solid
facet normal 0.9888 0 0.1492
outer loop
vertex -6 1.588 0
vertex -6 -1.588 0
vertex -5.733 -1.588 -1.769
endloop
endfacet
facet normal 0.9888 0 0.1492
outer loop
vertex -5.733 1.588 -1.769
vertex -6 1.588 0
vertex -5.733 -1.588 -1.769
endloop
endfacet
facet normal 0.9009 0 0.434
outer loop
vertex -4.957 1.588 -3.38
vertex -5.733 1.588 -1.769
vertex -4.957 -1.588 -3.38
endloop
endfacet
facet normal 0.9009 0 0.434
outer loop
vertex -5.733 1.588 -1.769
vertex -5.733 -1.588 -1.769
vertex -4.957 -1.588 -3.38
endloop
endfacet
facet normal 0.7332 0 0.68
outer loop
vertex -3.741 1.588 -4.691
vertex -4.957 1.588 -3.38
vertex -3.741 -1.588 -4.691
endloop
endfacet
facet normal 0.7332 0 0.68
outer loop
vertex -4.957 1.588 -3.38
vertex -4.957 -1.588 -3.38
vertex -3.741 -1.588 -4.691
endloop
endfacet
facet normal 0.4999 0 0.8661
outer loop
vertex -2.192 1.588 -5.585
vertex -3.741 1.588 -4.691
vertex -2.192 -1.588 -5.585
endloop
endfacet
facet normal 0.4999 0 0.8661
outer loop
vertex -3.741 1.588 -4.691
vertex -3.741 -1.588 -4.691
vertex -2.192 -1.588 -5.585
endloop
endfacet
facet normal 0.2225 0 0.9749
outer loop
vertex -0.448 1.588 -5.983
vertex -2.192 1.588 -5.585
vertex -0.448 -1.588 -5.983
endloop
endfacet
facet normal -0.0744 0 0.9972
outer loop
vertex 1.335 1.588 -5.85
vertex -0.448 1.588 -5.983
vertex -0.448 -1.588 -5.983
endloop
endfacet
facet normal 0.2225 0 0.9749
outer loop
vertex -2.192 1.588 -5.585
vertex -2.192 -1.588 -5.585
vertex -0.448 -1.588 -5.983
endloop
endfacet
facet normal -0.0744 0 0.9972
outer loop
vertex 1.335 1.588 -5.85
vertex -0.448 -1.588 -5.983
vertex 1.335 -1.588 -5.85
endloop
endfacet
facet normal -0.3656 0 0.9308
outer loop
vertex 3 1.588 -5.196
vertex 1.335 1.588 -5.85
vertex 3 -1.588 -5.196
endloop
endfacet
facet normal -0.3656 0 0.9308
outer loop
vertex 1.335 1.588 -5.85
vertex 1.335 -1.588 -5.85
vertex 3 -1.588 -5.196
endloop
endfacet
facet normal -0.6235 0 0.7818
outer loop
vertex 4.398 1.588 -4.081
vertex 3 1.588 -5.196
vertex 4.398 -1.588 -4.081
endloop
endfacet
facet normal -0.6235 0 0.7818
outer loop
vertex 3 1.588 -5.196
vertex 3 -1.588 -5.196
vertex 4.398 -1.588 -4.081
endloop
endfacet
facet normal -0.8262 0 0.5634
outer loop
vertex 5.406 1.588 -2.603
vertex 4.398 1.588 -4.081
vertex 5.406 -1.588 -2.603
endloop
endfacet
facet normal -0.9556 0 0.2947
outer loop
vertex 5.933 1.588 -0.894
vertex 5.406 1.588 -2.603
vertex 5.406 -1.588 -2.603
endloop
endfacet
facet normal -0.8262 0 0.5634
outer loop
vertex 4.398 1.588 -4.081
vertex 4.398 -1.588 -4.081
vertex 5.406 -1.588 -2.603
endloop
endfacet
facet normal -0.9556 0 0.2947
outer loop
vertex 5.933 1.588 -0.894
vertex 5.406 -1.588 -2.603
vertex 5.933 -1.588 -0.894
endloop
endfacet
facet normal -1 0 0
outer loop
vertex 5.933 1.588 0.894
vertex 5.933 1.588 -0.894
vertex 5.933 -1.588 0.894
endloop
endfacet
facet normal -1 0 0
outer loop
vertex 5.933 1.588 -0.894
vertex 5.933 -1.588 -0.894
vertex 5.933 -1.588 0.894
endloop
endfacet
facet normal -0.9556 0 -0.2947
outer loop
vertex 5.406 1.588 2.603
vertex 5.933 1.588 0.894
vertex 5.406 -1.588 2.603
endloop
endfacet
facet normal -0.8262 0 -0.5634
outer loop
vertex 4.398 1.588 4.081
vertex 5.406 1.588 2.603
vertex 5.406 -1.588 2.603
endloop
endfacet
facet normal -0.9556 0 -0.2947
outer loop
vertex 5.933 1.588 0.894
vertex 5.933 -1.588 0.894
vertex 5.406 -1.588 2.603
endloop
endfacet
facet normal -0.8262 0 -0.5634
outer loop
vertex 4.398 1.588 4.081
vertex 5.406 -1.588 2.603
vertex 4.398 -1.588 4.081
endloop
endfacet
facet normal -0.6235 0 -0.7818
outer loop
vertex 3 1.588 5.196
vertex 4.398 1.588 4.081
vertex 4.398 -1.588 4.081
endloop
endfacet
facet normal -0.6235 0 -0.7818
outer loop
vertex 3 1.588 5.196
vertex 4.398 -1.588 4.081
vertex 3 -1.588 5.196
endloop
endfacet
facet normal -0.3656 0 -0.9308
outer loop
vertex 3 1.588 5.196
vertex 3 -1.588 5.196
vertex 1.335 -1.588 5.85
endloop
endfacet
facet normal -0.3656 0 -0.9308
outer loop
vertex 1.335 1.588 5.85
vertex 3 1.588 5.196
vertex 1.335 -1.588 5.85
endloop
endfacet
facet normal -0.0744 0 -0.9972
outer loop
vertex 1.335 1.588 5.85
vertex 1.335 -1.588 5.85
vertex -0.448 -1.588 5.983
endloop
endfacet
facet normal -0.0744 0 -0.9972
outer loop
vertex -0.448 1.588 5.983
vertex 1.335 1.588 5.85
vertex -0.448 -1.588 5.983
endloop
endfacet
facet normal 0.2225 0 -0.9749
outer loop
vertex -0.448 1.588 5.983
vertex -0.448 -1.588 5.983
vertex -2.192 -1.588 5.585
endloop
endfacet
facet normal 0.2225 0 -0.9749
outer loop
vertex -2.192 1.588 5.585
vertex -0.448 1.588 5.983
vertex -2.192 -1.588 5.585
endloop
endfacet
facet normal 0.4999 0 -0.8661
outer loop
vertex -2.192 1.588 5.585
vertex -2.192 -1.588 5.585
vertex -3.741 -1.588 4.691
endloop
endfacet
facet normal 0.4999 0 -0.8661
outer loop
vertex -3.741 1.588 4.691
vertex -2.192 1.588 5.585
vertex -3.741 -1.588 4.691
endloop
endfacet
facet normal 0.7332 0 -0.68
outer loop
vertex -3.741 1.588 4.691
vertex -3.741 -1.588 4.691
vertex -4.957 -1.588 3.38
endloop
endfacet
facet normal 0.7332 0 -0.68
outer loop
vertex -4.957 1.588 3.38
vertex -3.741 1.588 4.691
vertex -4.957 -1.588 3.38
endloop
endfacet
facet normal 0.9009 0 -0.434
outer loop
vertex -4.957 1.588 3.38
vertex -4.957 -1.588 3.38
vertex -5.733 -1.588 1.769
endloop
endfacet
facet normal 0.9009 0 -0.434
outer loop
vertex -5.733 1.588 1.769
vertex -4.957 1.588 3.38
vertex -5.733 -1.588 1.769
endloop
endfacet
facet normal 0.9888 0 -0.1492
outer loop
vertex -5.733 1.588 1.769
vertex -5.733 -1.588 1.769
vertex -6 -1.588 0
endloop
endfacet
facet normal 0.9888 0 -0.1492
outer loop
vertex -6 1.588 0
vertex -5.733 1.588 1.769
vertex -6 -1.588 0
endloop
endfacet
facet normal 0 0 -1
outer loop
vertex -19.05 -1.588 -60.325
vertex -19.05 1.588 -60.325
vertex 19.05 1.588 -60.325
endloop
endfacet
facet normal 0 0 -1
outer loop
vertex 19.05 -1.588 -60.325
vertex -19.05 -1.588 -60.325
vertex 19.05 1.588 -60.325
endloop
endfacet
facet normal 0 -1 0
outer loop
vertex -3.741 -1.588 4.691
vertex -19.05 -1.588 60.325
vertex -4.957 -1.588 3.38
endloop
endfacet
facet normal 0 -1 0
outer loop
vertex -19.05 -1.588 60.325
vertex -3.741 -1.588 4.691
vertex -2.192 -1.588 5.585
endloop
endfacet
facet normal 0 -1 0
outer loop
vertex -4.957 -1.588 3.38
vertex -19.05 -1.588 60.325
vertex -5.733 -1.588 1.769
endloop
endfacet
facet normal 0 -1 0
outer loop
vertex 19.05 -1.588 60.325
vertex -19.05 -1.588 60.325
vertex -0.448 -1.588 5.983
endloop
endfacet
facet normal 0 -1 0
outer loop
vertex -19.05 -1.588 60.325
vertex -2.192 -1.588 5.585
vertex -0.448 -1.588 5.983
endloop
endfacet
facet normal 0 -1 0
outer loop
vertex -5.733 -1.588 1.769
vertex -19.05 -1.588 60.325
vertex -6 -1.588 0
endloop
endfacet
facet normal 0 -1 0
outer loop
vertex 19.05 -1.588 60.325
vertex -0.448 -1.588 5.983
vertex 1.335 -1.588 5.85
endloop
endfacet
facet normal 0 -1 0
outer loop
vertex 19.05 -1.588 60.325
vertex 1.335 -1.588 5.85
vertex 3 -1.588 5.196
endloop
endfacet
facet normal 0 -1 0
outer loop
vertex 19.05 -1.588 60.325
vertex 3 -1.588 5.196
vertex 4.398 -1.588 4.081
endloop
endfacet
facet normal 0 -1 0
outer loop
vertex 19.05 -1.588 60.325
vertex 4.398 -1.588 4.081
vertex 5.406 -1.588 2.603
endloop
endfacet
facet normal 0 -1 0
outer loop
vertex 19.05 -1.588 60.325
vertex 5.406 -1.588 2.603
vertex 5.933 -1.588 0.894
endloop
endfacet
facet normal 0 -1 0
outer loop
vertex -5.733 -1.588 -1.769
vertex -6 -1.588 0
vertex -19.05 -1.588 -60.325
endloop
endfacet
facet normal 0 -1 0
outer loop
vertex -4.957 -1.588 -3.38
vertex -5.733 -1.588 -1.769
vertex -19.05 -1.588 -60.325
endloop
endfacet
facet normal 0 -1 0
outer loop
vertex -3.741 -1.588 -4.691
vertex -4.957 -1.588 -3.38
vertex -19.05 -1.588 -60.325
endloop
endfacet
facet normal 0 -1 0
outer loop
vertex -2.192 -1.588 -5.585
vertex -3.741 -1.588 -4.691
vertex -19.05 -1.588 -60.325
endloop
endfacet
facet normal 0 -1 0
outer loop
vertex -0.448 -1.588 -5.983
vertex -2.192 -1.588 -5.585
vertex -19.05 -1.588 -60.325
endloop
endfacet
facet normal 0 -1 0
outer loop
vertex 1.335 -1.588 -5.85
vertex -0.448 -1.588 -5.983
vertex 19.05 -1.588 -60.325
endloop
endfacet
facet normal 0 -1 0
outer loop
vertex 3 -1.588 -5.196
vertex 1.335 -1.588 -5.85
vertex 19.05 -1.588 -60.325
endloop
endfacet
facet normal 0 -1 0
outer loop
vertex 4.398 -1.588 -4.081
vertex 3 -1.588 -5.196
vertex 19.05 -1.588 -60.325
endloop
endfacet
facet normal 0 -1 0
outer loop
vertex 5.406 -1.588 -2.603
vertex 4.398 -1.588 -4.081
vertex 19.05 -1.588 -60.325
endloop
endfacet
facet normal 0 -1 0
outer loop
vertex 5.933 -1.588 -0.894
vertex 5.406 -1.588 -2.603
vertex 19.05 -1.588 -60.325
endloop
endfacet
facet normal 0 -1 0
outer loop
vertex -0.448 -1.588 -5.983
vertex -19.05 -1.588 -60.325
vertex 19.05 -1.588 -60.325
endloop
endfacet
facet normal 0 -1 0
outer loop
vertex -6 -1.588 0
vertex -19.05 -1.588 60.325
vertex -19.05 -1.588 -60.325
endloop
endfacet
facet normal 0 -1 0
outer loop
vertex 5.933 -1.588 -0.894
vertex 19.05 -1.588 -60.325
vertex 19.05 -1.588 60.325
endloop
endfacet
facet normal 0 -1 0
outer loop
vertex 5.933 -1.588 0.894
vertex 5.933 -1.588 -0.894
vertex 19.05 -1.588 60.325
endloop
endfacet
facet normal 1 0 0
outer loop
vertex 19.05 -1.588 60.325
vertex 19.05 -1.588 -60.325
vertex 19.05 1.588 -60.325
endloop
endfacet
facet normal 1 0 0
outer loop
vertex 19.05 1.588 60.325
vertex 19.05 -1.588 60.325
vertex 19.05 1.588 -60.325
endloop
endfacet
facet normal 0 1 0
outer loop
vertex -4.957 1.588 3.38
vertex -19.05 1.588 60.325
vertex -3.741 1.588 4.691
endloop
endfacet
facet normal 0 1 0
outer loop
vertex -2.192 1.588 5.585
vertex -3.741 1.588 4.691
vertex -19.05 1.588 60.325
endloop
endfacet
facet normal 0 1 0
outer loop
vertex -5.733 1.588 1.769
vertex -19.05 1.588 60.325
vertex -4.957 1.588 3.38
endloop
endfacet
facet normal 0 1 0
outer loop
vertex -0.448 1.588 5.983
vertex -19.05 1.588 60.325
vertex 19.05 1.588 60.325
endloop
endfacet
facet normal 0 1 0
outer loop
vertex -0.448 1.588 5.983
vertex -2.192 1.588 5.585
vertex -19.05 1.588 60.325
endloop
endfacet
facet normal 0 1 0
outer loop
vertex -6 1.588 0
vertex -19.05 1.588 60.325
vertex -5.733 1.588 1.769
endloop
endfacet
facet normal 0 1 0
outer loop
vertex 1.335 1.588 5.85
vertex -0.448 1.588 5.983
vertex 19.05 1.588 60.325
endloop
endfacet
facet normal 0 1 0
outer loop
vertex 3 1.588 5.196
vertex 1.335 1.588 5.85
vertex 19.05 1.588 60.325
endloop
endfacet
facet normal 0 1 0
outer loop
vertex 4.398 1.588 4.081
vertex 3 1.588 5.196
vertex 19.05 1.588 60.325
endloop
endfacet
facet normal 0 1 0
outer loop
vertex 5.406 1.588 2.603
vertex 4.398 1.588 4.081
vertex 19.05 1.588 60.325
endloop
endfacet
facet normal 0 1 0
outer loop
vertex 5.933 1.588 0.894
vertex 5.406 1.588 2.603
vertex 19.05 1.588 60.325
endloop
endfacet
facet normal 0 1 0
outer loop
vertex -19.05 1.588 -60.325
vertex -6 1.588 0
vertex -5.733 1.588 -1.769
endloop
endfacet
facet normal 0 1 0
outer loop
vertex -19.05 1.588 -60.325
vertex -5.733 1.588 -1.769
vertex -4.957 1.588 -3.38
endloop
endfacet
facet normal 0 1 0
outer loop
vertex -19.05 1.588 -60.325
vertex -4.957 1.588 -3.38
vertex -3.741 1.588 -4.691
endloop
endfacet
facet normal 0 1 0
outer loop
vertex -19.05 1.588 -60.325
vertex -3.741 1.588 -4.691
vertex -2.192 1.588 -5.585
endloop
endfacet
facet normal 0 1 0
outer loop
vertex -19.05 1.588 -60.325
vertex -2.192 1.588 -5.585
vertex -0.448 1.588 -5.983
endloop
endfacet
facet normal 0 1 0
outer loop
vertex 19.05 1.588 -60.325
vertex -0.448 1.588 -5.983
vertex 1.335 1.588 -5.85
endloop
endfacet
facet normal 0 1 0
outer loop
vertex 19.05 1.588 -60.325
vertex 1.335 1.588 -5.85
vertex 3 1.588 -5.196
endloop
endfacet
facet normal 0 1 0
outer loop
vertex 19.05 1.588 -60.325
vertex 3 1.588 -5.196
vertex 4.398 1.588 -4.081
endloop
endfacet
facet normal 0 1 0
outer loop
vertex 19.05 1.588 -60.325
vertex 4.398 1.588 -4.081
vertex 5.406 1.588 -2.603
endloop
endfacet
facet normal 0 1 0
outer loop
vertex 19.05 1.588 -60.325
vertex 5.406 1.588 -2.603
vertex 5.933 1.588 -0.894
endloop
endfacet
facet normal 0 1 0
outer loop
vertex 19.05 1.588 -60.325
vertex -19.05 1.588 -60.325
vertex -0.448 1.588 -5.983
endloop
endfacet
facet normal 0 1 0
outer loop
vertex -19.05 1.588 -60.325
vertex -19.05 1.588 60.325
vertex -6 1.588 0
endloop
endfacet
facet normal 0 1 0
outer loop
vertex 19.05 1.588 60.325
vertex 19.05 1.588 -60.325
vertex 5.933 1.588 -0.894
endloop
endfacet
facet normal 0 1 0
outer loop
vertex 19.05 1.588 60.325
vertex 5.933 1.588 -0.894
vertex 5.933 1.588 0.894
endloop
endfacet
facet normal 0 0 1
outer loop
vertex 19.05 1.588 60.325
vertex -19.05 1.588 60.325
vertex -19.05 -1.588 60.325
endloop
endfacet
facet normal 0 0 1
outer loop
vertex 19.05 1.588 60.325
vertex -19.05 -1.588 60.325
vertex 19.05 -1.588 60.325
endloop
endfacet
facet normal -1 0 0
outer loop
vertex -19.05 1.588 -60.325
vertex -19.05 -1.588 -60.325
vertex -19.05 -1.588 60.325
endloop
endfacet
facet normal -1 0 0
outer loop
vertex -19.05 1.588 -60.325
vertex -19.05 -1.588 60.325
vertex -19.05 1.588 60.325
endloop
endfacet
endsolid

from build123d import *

# Parameters (mm, degrees)
BOSS_EXTRUDE1_DEPTH        = 60.325
BOSS_EXTRUDE1_DEPTH_BACK   = 60.325
SKETCH3_W                  = 38.1
SKETCH3_H                  = 3.175
F_12_0MM_DOWEL_HOLE1_D     = 12
F_12_0MM_DOWEL_HOLE1_DEPTH = 9.652
F_12_0MM_DOWEL_HOLE1_TIP   = 3.605163714


with BuildPart() as part:
    # Sketch3 → Boss-Extrude1 (new, two sides: drawn at the far end of the back side and taken through both)
    with BuildSketch(Plane.XY.offset(-BOSS_EXTRUDE1_DEPTH_BACK)):
        Rectangle(SKETCH3_W, SKETCH3_H)
    extrude(amount=BOSS_EXTRUDE1_DEPTH + BOSS_EXTRUDE1_DEPTH_BACK)

    # Ø12.0mm Dowel Hole1
    with Locations(Plane(origin=(0, 1.5875, 0), x_dir=(1, 0, 0), z_dir=(0, 1, 0))):
        with Locations((0, 0)):
            Hole(F_12_0MM_DOWEL_HOLE1_D / 2, depth=F_12_0MM_DOWEL_HOLE1_DEPTH)
            with Locations((0, 0, -(F_12_0MM_DOWEL_HOLE1_DEPTH + F_12_0MM_DOWEL_HOLE1_TIP / 2))):  # 118° drill point
                Cone(0, F_12_0MM_DOWEL_HOLE1_D / 2, F_12_0MM_DOWEL_HOLE1_TIP, mode=Mode.SUBTRACT)


solid = part.part
